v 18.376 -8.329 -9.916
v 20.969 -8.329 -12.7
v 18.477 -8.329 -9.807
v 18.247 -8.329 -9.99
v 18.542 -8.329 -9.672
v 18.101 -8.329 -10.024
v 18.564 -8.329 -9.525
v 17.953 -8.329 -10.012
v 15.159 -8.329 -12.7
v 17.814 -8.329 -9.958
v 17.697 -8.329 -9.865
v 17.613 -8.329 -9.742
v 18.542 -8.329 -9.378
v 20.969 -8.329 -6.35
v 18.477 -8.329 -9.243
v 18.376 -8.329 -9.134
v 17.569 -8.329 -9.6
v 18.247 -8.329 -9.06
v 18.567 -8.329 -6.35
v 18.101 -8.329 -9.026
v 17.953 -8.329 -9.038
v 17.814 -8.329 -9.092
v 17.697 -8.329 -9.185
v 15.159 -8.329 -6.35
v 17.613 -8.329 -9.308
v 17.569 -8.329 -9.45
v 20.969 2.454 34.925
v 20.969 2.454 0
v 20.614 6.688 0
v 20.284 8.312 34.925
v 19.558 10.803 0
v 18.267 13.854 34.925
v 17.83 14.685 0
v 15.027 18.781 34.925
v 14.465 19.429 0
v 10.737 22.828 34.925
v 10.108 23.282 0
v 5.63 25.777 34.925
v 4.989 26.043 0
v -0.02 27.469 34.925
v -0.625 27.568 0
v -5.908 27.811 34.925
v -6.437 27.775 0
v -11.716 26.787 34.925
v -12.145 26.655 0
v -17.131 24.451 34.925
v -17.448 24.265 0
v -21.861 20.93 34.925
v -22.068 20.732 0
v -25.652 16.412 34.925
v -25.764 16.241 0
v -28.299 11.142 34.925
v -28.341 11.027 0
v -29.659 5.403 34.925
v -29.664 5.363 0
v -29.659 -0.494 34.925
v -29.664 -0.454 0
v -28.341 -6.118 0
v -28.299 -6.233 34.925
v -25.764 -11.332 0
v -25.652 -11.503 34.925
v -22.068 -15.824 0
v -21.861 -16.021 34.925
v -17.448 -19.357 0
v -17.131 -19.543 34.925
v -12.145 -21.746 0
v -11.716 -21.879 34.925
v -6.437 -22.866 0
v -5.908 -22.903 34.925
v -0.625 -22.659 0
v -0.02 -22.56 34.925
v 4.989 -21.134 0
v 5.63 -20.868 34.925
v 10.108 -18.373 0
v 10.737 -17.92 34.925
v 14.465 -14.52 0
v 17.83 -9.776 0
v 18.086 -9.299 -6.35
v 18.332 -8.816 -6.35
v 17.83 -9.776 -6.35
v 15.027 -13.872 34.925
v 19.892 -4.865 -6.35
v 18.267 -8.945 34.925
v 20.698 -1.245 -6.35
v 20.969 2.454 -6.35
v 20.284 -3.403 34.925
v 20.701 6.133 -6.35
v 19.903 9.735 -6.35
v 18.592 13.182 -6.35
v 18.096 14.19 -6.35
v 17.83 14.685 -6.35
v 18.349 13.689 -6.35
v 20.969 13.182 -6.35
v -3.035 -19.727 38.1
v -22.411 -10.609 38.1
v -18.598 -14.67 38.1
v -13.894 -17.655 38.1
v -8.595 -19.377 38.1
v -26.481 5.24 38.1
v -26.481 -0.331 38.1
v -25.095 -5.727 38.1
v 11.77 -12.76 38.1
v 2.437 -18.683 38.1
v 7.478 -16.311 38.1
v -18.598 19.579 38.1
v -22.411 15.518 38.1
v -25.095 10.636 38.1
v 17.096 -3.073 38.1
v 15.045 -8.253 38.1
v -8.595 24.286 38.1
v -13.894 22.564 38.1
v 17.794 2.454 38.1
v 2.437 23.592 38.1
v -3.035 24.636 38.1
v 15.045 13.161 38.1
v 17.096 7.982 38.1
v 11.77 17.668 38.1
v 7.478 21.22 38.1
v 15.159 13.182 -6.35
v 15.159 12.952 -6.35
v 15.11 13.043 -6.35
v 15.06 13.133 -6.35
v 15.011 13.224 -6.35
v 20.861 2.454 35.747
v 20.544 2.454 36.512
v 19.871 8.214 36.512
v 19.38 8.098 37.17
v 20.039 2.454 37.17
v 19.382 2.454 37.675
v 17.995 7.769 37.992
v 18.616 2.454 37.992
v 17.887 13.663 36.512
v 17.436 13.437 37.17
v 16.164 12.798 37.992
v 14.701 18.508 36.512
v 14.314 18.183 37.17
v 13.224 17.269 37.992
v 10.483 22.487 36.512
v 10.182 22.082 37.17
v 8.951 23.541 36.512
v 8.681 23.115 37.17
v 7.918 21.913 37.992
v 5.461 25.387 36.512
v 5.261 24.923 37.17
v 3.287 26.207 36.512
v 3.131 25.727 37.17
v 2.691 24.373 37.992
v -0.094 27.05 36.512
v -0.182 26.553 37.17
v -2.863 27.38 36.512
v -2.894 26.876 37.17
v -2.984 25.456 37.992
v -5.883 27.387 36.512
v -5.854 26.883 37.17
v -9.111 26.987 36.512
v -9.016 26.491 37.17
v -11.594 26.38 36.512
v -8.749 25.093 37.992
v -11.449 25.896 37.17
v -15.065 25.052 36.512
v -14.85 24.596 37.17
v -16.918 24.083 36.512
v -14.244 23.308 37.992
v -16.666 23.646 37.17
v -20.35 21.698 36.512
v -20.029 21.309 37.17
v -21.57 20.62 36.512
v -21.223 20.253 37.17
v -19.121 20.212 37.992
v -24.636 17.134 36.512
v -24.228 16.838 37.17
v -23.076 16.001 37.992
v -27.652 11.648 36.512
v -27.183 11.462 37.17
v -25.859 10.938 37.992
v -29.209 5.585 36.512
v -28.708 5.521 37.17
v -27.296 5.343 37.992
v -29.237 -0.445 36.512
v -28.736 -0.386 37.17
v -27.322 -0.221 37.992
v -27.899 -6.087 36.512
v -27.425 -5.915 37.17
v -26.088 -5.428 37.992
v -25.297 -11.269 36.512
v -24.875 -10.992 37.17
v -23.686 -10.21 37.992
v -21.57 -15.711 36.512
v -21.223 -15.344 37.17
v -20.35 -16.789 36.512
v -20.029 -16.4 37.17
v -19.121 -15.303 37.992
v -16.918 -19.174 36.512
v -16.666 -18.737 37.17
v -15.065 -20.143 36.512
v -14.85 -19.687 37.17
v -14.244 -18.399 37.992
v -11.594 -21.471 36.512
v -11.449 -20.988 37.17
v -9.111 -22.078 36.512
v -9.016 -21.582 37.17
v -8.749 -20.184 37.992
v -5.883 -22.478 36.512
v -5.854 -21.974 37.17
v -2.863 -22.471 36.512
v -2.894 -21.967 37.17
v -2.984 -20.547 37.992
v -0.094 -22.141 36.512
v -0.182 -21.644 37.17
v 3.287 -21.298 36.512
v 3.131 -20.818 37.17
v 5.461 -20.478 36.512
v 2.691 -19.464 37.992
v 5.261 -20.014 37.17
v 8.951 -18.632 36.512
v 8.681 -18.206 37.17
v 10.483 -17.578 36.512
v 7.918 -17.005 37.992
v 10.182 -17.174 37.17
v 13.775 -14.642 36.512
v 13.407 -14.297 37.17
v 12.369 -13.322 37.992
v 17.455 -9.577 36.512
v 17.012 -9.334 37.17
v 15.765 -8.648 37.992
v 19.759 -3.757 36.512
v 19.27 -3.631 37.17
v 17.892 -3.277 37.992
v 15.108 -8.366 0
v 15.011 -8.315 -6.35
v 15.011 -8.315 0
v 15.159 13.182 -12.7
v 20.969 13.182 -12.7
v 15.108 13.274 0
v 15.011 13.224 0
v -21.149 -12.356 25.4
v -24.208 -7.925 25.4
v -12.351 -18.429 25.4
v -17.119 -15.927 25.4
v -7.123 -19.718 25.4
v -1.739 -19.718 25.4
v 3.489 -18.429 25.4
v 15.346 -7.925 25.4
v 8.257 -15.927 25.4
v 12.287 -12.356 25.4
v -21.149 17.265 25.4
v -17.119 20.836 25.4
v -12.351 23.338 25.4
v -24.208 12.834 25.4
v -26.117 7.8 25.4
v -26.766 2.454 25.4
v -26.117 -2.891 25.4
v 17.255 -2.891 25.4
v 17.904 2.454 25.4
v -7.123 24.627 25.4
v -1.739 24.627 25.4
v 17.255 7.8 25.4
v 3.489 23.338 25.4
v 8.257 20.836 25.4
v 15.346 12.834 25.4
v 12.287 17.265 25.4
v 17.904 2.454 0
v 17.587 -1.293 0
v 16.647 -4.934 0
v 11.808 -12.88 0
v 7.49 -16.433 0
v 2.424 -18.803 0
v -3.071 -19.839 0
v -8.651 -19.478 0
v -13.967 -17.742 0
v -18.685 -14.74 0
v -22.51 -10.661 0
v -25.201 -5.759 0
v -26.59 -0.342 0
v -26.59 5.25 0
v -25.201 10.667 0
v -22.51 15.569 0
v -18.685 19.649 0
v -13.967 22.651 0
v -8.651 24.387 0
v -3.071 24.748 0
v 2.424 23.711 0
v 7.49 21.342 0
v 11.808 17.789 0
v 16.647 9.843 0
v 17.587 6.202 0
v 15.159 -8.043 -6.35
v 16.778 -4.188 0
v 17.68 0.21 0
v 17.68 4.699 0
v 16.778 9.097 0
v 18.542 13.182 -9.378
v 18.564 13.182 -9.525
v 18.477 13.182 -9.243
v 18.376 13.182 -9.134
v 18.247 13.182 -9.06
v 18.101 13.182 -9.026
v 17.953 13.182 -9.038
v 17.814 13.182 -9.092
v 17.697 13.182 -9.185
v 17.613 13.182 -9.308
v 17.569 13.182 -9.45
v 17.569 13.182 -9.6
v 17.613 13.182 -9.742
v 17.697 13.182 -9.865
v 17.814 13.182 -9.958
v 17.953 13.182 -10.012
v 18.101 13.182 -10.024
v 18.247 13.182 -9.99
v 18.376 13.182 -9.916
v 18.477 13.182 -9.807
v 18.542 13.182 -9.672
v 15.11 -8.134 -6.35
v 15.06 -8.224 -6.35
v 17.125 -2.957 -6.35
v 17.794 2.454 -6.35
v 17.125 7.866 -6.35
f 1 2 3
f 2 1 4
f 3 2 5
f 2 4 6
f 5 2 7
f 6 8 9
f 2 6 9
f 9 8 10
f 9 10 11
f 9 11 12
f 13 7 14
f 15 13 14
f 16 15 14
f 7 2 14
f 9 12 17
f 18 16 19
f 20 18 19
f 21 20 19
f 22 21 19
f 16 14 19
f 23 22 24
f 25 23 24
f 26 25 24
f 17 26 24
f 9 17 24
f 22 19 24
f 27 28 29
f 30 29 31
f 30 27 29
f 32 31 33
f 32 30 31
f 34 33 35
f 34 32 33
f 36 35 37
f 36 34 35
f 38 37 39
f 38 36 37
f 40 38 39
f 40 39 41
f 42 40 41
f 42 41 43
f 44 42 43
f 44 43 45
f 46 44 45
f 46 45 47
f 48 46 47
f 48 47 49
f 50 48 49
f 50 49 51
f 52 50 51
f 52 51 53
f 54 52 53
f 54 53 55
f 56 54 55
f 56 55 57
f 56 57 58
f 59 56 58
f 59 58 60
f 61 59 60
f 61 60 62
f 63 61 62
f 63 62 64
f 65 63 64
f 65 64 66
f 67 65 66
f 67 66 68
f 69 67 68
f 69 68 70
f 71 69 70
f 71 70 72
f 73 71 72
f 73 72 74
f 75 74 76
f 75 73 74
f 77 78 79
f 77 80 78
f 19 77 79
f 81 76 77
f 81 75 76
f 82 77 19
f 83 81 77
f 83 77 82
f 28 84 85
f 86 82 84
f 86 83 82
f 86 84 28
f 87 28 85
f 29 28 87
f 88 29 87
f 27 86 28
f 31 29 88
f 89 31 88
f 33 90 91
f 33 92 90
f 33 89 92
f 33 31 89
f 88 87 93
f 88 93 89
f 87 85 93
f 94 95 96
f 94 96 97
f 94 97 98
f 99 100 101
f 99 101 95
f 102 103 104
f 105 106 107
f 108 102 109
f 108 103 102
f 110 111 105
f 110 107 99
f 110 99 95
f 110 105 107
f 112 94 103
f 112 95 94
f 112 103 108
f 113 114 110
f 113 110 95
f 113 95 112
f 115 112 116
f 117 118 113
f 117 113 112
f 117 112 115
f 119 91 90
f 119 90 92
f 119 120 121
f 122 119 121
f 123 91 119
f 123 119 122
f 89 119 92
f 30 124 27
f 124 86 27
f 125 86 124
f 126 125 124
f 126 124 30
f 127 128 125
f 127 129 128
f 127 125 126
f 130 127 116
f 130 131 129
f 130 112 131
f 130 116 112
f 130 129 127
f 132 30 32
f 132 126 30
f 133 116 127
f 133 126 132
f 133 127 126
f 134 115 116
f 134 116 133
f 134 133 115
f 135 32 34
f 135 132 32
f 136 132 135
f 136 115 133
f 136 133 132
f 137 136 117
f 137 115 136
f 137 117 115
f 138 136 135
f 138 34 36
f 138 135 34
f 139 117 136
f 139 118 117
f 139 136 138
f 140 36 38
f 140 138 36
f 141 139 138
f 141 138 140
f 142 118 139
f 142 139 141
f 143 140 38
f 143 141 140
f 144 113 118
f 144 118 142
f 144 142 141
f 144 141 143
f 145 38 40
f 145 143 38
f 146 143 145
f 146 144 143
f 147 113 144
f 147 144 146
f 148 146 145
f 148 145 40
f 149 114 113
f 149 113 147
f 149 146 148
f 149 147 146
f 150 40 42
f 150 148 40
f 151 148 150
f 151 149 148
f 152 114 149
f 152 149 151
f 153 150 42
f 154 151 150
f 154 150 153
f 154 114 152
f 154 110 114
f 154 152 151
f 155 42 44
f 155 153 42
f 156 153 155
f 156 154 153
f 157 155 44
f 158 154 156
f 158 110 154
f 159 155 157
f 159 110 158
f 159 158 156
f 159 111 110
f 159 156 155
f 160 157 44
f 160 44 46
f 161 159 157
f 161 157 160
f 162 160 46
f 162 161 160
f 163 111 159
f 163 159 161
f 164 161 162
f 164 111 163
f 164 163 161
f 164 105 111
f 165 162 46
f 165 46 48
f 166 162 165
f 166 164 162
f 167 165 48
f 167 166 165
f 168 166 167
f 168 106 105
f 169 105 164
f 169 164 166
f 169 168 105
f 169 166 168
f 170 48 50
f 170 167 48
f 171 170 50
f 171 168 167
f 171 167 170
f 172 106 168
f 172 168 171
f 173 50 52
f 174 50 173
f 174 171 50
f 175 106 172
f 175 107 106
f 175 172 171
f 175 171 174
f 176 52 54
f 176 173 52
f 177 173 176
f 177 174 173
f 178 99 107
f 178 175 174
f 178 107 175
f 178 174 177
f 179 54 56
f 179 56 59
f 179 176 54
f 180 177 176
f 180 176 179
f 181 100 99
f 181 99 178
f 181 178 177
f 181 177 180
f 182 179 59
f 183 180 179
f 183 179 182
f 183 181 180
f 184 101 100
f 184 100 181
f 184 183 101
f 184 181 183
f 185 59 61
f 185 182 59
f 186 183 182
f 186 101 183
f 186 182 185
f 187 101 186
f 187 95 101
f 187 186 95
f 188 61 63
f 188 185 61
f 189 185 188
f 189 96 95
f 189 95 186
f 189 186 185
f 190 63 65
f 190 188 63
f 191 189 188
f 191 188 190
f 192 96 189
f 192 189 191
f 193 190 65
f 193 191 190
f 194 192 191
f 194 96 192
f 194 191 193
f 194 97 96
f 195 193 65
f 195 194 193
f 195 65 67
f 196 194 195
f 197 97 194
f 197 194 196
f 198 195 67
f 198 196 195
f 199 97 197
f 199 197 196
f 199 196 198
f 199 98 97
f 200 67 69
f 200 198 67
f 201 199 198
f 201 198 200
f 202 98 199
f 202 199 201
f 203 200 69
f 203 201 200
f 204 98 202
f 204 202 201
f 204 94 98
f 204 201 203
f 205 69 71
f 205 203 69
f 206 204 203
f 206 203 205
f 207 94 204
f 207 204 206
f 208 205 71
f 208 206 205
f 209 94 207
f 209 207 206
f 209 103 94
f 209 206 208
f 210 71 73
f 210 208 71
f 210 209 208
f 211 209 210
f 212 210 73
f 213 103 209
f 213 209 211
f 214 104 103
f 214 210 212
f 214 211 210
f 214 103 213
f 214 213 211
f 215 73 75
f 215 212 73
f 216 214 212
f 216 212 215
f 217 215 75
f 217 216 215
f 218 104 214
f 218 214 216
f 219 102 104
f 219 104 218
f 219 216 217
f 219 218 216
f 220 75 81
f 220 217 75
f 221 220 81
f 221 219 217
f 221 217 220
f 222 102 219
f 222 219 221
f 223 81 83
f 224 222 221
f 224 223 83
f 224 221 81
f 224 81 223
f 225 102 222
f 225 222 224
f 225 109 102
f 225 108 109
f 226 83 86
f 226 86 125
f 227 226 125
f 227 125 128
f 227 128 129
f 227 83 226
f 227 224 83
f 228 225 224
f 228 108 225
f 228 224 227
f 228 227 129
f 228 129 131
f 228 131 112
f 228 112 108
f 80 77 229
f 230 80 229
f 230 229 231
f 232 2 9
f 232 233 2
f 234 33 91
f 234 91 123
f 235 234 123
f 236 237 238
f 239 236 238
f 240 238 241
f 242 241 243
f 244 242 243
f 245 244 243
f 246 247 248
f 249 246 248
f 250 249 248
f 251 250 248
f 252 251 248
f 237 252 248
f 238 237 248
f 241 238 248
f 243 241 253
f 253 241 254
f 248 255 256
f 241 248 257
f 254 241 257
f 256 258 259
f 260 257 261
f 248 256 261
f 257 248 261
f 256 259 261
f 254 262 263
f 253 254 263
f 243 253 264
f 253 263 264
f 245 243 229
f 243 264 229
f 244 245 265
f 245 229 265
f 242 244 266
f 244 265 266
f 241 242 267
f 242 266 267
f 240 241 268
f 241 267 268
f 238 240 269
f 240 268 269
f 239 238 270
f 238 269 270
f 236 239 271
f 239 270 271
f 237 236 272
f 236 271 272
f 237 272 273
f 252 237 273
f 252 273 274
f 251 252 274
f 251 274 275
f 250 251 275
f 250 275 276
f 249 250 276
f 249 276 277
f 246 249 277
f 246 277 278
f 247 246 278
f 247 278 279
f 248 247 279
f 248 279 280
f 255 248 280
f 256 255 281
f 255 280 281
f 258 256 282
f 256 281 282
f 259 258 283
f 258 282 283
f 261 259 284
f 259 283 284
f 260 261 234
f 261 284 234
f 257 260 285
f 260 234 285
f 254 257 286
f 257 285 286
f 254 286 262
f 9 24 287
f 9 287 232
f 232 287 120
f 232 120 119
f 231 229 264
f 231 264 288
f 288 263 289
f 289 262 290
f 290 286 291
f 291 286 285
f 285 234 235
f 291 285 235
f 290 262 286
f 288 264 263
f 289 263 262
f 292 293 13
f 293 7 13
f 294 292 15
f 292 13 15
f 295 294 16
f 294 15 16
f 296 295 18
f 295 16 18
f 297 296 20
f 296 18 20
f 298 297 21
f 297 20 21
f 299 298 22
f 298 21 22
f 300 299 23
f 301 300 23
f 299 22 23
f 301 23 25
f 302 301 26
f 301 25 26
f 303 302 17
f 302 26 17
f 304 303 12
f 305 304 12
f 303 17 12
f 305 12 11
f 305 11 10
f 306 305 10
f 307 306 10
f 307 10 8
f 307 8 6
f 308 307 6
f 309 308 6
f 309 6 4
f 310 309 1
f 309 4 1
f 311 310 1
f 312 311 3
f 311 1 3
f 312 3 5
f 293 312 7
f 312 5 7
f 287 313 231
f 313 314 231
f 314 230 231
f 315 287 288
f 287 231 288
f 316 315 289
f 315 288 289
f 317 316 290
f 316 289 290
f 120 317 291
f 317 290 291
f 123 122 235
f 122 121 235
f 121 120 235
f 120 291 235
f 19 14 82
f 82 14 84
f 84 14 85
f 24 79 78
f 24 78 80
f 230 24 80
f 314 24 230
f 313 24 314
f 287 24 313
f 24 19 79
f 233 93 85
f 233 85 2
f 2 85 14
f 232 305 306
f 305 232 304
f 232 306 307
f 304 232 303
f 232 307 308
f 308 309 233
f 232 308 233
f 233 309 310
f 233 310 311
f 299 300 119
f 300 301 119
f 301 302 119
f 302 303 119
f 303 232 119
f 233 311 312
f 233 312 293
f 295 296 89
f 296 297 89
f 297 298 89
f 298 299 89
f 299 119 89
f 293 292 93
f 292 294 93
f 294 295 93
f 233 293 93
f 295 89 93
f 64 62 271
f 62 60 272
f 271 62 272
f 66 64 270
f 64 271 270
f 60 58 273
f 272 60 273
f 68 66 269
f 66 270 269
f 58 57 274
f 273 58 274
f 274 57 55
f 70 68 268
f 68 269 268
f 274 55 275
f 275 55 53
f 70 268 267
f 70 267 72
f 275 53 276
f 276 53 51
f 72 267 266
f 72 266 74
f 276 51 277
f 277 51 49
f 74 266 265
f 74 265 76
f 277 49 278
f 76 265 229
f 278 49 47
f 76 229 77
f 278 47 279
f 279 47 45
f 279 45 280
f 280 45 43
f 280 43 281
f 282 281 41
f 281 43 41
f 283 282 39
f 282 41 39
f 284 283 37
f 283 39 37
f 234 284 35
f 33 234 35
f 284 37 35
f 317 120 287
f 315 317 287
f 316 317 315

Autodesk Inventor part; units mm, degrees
ref_plane "YZ Plane" through (0, 0, 0) normal (1, 0, 0) x (0, 1, 0)
ref_plane "XZ Plane" through (0, 0, 0) normal (0, 1, 0) x (-1, 0, 0)
ref_plane "XY Plane" through (0, 0, 0) normal (0, 0, 1) x (1, 0, 0)
sketch "Sketch1" plane through (0, 0, 0) normal (0, 0, 1) x (1, 0, 0)
  circle A0 centre (-4.4309, 2.4544) radius 22.335
  circle A1 centre (-4.4309, 2.4544) radius 25.4
  point P0 (0, 0)
  dimension "d0" = 44.67
  dimension "d1" = 50.8
extrude "Extrusion1" add sketch "Sketch1" along normal blind 25.4
sketch "Sketch2" plane through (-4.4309, 2.4544, 25.4) normal (0, 0, 1) x (1, 0, 0)
  circle A0 centre (0, 0) radius 25.4
  point P0 (4.4309, -2.4544)
extrude "Extrusion2" add sketch "Sketch2" along normal blind 12.7
fillet "Fillet1" radius 3.175 1 edges at (-29.8309, 2.4544, 38.1)
sketch "Sketch3" plane through (-4.4309, 2.4544, 0) normal (0, 0, -1) x (-1, 0, 0)
  circle A0 centre (0, 0) radius 25.4 projected
  arc A1 (-22.2614, 12.2307) -> (-22.2614, -12.2307) centre (0, 0) ccw
  line L0 (-22.2614, 12.2307) -> (-22.2614, -12.2307) construction
  line L1 (-22.2614, 12.2307) -> (2.1999, 12.2307) construction
  circle A2 centre (0, 0) radius 22.225 projected
  arc A3 (-19.4415, 10.7694) -> (-19.4415, -10.7694) centre (0, 0) ccw
  line L2 (-19.4415, 10.7694) -> (-19.4415, -10.7694) construction
  line L3 (-19.4415, 10.7694) -> (2.0972, 10.7694) construction
  line L4 (-22.2614, -12.2307) -> (-19.4415, -10.7694)
  line L5 (-22.2614, 12.2307) -> (-19.4415, 10.7694)
  point P0 (-4.4309, -2.4544)
  dimension "d7" = 90
  dimension "d8" = 90
extrude "Extrusion3" add sketch "Sketch3" along normal blind 6.35 contours L5 A2 L4 A0 picked at (-24.2184, -0.7482)
sketch "Sketch4" plane through (-4.4309, 2.4544, -6.35) normal (0, 0, -1) x (-1, 0, 0)
  circle A0 centre (0, 0) radius 22.335 projected
  line L0 (-19.5898, 10.728) -> (-25.4, 10.728)
  line L1 (-25.4, 10.728) -> (-25.4, -10.7831)
  line L2 (-25.4, -10.7831) -> (-19.5898, -10.7831)
  line L3 (-19.5898, -10.7831) -> (-19.5898, 10.728)
  point P0 (-4.4309, -2.4544)
extrude "Extrusion4" add sketch "Sketch4" along normal blind 6.35 contours L3 A0 | A0 L3 L2 L1 L0 picked at (-20.171, -2.2046)
sketch "Sketch5" plane through (-4.4309, 2.4544, -6.35) normal (0, 0, -1) x (-1, 0, 0)
  point P0 (-4.4309, -2.4544)
sketch "Sketch6" plane through (18.5665, -8.3288, -6.35) normal (0, -1, 0) x (1, 0, 0)
  line L0 (-3.4076, -6.35) -> (2.4025, -6.35) projected
  line L1 (-3.4076, 0) -> (0, 0) projected
  line L2 (2.4025, -6.35) -> (-3.4076, 0) construction
  line L3 (-3.4076, -6.35) -> (2.4025, 0) construction
  line L4 (2.4025, 0) -> (2.4025, 41.275) projected
  circle A0 centre (-0.5026, -3.175) radius 0.5
  point P0 (-18.5665, 6.35)
  dimension "d13" = 1
extrude "Extrusion5" cut sketch "Sketch6" against normal blind 25.4
properties part number "ballcarriage"
